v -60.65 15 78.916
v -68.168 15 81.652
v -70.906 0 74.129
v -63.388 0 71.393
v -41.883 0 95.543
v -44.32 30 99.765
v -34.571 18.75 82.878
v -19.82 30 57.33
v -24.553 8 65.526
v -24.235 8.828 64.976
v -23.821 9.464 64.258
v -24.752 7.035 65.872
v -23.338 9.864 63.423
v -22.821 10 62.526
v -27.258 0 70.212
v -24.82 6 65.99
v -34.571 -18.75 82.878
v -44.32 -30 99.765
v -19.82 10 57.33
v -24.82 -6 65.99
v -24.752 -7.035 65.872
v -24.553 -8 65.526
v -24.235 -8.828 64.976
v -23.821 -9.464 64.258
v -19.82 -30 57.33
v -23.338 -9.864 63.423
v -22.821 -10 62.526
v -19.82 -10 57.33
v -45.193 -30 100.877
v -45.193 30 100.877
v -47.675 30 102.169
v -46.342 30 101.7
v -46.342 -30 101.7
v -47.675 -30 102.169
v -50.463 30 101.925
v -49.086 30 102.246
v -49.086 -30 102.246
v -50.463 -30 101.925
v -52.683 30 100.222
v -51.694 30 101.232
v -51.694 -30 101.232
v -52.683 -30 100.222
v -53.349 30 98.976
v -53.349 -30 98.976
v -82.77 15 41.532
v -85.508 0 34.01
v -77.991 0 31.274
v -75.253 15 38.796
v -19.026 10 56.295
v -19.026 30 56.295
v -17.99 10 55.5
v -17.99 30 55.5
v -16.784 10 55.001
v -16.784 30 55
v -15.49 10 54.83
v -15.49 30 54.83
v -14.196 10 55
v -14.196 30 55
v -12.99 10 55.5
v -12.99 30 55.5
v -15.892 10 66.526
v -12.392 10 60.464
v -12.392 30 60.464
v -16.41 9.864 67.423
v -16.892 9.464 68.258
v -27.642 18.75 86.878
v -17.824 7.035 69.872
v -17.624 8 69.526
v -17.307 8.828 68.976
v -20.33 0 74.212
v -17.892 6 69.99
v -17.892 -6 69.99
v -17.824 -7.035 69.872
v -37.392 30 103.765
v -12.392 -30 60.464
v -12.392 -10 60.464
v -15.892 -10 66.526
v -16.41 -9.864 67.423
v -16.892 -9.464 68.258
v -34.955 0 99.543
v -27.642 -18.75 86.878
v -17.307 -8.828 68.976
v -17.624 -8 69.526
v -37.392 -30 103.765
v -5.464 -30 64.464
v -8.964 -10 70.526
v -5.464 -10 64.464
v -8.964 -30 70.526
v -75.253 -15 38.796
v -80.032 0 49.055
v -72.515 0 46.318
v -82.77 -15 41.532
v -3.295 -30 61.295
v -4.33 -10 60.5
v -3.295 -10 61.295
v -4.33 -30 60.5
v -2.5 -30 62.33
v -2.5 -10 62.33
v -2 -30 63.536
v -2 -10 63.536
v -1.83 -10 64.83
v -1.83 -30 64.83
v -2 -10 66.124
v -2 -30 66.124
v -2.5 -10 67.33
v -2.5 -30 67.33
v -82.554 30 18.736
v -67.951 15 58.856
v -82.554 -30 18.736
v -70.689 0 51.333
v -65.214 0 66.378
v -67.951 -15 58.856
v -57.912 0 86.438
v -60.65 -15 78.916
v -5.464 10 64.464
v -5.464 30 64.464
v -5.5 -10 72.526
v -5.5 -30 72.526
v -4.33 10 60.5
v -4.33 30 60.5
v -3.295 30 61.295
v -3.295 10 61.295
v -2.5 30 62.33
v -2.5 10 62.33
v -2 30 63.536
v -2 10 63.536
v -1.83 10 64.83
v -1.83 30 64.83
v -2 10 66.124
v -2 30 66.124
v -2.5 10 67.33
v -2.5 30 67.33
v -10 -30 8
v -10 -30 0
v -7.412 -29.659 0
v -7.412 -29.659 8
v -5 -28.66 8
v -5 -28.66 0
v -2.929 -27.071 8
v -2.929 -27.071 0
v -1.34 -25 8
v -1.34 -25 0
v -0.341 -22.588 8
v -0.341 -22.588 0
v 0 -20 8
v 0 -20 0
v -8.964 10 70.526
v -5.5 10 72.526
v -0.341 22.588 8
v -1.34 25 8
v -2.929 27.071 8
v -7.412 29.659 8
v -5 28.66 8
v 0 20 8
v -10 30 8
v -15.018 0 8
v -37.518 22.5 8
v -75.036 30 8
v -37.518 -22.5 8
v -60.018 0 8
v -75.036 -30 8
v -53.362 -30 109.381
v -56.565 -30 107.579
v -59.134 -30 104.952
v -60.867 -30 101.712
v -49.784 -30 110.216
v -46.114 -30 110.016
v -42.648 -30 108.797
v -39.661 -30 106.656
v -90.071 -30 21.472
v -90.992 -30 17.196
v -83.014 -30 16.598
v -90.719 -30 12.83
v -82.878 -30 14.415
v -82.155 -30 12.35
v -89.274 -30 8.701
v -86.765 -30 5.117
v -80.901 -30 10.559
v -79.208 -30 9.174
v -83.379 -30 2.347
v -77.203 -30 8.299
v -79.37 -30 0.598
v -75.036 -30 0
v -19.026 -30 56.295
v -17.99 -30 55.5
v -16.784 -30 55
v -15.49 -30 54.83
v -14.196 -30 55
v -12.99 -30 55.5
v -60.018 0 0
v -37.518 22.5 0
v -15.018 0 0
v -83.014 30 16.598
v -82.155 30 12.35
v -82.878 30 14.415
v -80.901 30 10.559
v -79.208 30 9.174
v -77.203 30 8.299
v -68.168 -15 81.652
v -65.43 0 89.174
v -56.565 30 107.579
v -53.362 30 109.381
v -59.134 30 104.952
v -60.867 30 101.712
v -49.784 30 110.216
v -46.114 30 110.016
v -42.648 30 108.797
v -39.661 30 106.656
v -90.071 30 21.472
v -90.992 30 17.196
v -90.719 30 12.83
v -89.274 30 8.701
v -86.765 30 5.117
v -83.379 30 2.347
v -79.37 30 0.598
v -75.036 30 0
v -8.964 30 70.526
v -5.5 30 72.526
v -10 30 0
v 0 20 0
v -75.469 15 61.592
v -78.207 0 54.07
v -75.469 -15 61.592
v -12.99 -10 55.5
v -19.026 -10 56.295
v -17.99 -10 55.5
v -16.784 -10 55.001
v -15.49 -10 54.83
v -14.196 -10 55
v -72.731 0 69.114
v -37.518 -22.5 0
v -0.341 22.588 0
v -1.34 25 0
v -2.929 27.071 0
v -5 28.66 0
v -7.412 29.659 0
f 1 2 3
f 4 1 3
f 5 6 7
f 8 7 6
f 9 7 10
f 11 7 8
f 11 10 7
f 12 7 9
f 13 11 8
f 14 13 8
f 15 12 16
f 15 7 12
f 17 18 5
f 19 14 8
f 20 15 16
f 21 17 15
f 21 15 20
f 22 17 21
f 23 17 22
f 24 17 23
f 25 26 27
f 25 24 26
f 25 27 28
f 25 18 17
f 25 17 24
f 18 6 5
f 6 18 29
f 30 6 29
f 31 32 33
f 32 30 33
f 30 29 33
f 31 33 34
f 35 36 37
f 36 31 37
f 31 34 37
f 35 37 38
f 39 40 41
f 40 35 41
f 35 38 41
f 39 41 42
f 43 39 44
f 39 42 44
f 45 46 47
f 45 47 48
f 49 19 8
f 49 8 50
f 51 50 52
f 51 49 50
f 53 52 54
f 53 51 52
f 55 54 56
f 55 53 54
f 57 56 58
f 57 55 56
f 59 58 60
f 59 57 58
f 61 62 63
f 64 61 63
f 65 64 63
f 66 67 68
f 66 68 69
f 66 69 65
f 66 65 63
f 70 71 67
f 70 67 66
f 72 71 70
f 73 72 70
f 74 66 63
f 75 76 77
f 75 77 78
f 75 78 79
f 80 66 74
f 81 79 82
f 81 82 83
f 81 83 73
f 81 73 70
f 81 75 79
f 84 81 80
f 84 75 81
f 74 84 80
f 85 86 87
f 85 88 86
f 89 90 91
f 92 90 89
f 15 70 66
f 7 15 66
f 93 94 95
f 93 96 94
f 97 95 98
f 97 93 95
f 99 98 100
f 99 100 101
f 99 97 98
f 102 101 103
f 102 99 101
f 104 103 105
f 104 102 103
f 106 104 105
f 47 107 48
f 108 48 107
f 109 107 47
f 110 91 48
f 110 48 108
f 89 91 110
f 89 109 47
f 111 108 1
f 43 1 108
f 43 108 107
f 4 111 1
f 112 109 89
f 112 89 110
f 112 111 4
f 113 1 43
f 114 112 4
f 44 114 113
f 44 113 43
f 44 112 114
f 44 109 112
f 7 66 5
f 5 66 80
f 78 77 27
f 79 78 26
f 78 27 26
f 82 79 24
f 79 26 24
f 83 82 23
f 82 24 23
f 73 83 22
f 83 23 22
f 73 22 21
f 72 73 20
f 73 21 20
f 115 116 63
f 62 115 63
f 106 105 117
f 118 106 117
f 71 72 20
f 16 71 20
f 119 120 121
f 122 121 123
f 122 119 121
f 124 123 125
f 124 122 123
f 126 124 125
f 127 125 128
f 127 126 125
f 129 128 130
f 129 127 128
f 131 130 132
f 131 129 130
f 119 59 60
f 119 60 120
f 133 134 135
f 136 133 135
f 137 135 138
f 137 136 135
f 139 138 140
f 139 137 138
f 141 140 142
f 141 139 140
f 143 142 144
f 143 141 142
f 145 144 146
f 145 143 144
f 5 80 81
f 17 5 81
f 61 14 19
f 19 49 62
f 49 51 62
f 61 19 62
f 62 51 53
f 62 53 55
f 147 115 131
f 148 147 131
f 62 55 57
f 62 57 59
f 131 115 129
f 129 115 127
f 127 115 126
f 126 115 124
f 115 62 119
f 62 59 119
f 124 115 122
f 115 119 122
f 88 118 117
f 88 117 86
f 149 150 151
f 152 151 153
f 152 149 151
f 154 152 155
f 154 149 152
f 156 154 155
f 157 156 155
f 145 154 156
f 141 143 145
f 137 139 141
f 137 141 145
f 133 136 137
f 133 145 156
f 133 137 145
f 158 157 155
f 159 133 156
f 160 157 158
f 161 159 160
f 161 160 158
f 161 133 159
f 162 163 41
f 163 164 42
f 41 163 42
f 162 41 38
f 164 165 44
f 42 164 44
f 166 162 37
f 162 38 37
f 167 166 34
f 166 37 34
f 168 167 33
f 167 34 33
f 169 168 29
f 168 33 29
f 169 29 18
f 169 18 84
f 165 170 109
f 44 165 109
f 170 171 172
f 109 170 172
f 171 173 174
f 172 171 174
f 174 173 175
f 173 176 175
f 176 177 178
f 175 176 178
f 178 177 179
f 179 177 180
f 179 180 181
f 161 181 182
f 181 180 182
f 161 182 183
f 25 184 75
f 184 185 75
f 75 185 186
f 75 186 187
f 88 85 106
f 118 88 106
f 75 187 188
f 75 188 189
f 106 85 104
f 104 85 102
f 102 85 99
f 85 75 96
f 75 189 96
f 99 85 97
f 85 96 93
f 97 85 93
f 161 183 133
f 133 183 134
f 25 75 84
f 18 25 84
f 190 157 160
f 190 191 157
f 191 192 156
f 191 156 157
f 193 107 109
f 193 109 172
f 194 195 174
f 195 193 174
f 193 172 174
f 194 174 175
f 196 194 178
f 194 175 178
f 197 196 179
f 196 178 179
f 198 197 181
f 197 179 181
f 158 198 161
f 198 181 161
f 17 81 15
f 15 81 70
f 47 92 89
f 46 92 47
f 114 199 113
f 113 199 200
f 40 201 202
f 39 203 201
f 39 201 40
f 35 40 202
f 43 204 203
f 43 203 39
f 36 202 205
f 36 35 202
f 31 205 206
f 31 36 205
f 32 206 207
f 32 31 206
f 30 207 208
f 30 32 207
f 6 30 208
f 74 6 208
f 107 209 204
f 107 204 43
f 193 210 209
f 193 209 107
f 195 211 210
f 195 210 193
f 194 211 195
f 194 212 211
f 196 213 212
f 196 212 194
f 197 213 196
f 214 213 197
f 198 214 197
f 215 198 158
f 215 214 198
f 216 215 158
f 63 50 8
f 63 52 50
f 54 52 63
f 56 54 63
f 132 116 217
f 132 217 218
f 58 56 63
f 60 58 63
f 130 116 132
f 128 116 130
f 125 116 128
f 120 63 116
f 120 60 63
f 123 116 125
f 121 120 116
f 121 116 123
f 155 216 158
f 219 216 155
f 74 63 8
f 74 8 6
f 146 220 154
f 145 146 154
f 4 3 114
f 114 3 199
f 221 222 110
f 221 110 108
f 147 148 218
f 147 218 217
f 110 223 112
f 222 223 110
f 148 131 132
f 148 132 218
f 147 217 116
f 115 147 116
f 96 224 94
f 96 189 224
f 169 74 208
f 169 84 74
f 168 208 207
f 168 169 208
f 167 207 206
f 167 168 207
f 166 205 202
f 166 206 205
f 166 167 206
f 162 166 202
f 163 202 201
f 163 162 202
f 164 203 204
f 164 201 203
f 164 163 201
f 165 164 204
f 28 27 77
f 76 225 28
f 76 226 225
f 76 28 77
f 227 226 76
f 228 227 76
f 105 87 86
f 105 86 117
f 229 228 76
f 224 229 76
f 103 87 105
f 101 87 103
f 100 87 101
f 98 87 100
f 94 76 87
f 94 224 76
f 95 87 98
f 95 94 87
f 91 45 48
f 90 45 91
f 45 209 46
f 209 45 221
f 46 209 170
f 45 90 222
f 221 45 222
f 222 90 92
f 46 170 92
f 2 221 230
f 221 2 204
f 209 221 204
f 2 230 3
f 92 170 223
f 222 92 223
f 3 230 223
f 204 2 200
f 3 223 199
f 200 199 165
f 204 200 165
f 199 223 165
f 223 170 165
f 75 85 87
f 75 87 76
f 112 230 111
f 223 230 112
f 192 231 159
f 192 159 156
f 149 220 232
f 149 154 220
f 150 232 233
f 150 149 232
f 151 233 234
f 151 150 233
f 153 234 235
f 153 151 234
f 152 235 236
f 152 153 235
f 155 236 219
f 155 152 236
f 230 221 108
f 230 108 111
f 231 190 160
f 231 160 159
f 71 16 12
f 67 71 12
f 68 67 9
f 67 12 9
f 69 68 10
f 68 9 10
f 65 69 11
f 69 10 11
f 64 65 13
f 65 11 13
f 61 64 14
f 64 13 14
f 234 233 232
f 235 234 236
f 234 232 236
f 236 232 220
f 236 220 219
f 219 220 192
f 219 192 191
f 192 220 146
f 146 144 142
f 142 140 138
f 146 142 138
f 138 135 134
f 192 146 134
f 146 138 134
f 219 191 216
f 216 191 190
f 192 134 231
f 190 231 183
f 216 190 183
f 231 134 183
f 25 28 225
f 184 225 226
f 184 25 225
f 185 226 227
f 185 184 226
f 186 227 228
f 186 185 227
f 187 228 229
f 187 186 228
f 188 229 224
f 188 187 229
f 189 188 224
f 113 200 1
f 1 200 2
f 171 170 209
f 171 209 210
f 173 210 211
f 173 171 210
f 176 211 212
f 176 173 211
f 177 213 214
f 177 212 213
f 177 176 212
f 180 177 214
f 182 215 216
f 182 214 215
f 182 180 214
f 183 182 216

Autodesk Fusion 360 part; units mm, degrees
sketch "Skizze1" plane through (0, 0, 0) normal (0, 1, 0) x (1, 0, 0)
  line L0 (0, 0) -> (-75.0363, 0)
  line L1 (-90.0714, -21.4723) -> (-60.8666, -101.7116)
  line L2 (0, 0) -> (0, -8)
  line L3 (0, -8) -> (-75.0363, -8)
  line L4 (-82.5538, -18.7362) -> (-53.3491, -98.9755)
  line L5 (-44.3205, -99.7654) -> (-17.3205, -53)
  line L6 (-17.3205, -53) -> (0, -63)
  line L7 (0, -63) -> (-5.5, -72.5263)
  line L8 (-5.5, -72.5263) -> (-8.9641, -70.5263)
  line L9 (-8.9641, -70.5263) -> (-5.4641, -64.4641)
  line L10 (-5.4641, -64.4641) -> (-12.3923, -60.4641)
  line L11 (-12.3923, -60.4641) -> (-37.3923, -103.7654)
  arc A0 (-53.3491, -98.9755) -> (-44.3205, -99.7654) centre (-48.6506, -97.2654) ccw
  arc A1 (-60.8666, -101.7116) -> (-37.3923, -103.7654) centre (-48.6506, -97.2654) ccw
  arc A2 (-75.0363, 0) -> (-90.0714, -21.4723) centre (-75.0363, -16) ccw
  arc A3 (-75.0363, -8) -> (-82.5538, -18.7362) centre (-75.0363, -16) ccw
  dimension "d3" = 8
  dimension "d4" = 8
  dimension "d5" = 8
  dimension "d7" = 30
  dimension "d8" = 4
  dimension "d10" = 4
  dimension "d11" = 8
  dimension "d12" = 7
  dimension "d19" = 70
  dimension "d20" = 50
  dimension "d21" = 5
  dimension "d23" = 8
  dimension "d24" = 45
extrude "Extrusion1" add sketch "Skizze1" along normal mid plane 60
fillet "Abrundung1" radius 10 2 edges at (0, 30, 4) (0, -30, 4)
fillet "Abrundung2" radius 5 2 edges at (-17.3205, 0, 53) (0, 0, 63)
sketch "Skizze2" plane through (-86.4361, 0, 31.4602) normal (-0.9397, 0, 0.342) x (0, -1, 0)
  line L0 (30, 74.7601) -> (-30, 74.7601)
  line L1 (-30, 74.7601) -> (-30, -10.6288)
  line L2 (-30, -10.6288) -> (30, -10.6288)
  line L3 (30, -10.6288) -> (30, 74.7601)
  line L4 (37, 74.7601) -> (69, 74.7601) construction
  line L5 (40.6572, -10.6288) -> (65.6572, -10.6288) construction
  line L6 (0, 61.418) -> (-15, 53.4128)
  line L7 (-15, 53.4128) -> (0, 45.4076)
  line L8 (0, 45.4076) -> (15, 53.4128)
  line L9 (15, 53.4128) -> (0, 61.418)
  line L10 (0, 95.9999) -> (0, -24.4616) construction
  line L11 (-15, 32.0656) -> (0, 40.0708)
  line L12 (15, 32.0656) -> (0, 24.0604)
  line L13 (0, 24.0604) -> (-15, 32.0656)
  line L14 (0, 40.0708) -> (15, 32.0656)
  line L15 (-15, 10.7184) -> (0, 18.7236)
  line L16 (15, 10.7184) -> (0, 2.7132)
  line L17 (0, 18.7236) -> (15, 10.7184)
  line L18 (0, 2.7132) -> (-15, 10.7184)
  line L19 (57.2523, 53.4128) -> (36.8368, 53.4128) construction
  line L20 (40.2669, 10.7184) -> (51.2669, 10.7184) construction
  line L21 (43.1326, 32.0656) -> (76.5646, 32.0656) construction
  line L22 (-30, 110.8277) -> (-30, 88.3059) construction
  line L23 (30, 114.6963) -> (30, 87.6508) construction
  line L24 (-15, 108.062) -> (-15, 86.5063) construction
  line L25 (15, 103.3946) -> (15, 87.227) construction
  line L26 (38.9734, 64.0864) -> (51.9734, 64.0864) construction
  line L27 (38.9734, 58.7496) -> (51.9734, 58.7496) construction
  line L28 (39, 61.418) -> (48, 61.418) construction
  line L29 (38.4081, 40.0708) -> (47.4081, 40.0708) construction
  line L30 (37.9929, 37.4024) -> (54, 37.4024) construction
  line L31 (38.8043, 42.7392) -> (51.8043, 42.7392) construction
  line L32 (38.9581, 21.392) -> (51.9581, 21.392) construction
  line L33 (38.4081, 18.7236) -> (47.4081, 18.7236) construction
  line L34 (40.1572, 16.0552) -> (53.1572, 16.0552) construction
sketch "Skizze3" plane through (0, 0, 0) normal (0, 0, -1) x (1, 0, 0)
  line L0 (-10, 30) -> (-75.0363, 30)
  line L1 (-75.0363, 30) -> (-75.0363, -30)
  line L2 (-75.0363, -30) -> (-10, -30)
  line L3 (-37.5181, 22.5) -> (-15.0181, 0)
  line L4 (-15.0181, 0) -> (-37.5181, -22.5)
  line L5 (-37.5181, -22.5) -> (-60.0181, 0)
  line L6 (-60.0181, 0) -> (-37.5181, 22.5)
  line L7 (20.4049, 0) -> (39.4049, 0) construction
  line L8 (22.3322, 30) -> (39.3616, 30) construction
  line L9 (19.3322, -30) -> (41.3322, -30) construction
  line L10 (-37.5181, 48.9997) -> (-37.5181, 36.9997) construction
  line L11 (-75.0363, 50.8097) -> (-75.0363, 32.3583) construction
  line L12 (0, 53.6395) -> (0, 35.107) construction
  arc A0 (0, 20) -> (-10, 30) centre (-10, 20) ccw
  arc A1 (-10, -30) -> (0, -20) centre (-10, -20) ccw
  line L13 (0, -20) -> (0, 20)
  dimension "d82" = 7.5
sketch "Skizze4" plane through (0, 0, 0) normal (0, 1, 0) x (1, 0, 0)
  line L0 (-7.5, -75.9904) -> (-24.8205, -65.9904)
  line L1 (-24.8205, -65.9904) -> (-17.3205, -53)
  line L2 (-17.3205, -53) -> (0, -63)
  line L3 (0, -63) -> (-7.5, -75.9904)
  line L4 (-4.3301, -60.5) -> (-12.9904, -55.5)
  line L5 (-5.5, -72.5263) -> (-2.5, -67.3301)
  line L6 (-19.8205, -57.3301) -> (-44.3205, -99.7654)
  dimension "d68" = 15
extrude "Extrusion2" cut sketch "Skizze4" along normal mid plane 20
fillet "Abrundung3" radius 4 2 edges at (-21.3564, 10, 67.9904) (-21.3564, -10, 67.9904)
sketch "Skizze5" plane through (16.8875, 0, 9.75) normal (0.866, 0, 0.5) x (0, 1, 0)
  line L0 (30, 58.5596) -> (30, 108.5596)
  line L1 (30, 108.5596) -> (-30, 108.5596)
  line L2 (-30, 108.5596) -> (-30, 58.5596)
  line L3 (18.75, 89.0596) -> (0, 103.6846)
  line L4 (0, 103.6846) -> (-18.75, 89.0596)
  line L5 (-18.75, 89.0596) -> (0, 74.4346)
  line L6 (0, 74.4346) -> (18.75, 89.0596)
  line L7 (18.75, 89.0596) -> (-18.75, 89.0596) construction
  line L8 (0, 103.6846) -> (0, 74.4346) construction
  line L9 (0, 132.1709) -> (0, 54.7397)
  line L10 (57, 89.0596) -> (43, 89.0596) construction
  line L11 (41.8287, 108.5596) -> (56.8287, 108.5596) construction
  line L12 (41.1202, 69.5596) -> (58.1202, 69.5596) construction
  line L13 (10, 58.5596) -> (30, 58.5596)
  line L14 (15, 145.9398) -> (15, 132.9398) construction
  line L15 (22.5, 142.6003) -> (22.5, 134.6003) construction
  line L16 (42, 103.6846) -> (64, 103.6846) construction
  line L17 (42, 98.8096) -> (60, 98.8096) construction
  line L18 (18.75, 141.5724) -> (18.75, 135.5724) construction
  line L19 (10, 65.5596) -> (10, 58.5596)
  line L20 (-10, 58.5596) -> (-10, 65.5596)
  arc A0 (-6, 69.5596) -> (-10, 65.5596) centre (-6, 65.5596) ccw
  arc A1 (10, 65.5596) -> (6, 69.5596) centre (6, 65.5596) ccw
  line L21 (-6, 69.5596) -> (6, 69.5596)
  line L22 (-30, 58.5596) -> (-10, 58.5596)
  point P0 (0, 89.0596)
extrude "Extrusion3" cut sketch "Skizze5" against normal up to surface (8 mm away) contours L4 L5 L9 | L3 L6 L9
extrude "Extrusion4" cut sketch "Skizze3" against normal up to surface (8 mm away) contours L3 L4 L5 L6
extrude "Extrusion5" cut sketch "Skizze2" against normal up to surface (8 mm away) contours L6 L7 L8 L9 | L11 L12 L13 L14 | L15 L16 L17 L18
equation "angle = 30 deg"
equation "d4 = d3"
equation "d5 = d3"
equation "d7 = angle"
equation "d8 = d3 / 2"
equation "thickness = 8 mm"
equation "d10 = d8"
equation "d11 = thickness"
equation "d12 = bracket_depth"
equation "bracket_depth = 7 mm"
equation "length = 150 mm"
equation "width = 60 mm"
equation "cable_width = 20 mm"
equation "d20 = length / 3"
equation "d24 = platform_height"
equation "platform_height = 45 mm"
equation "d26 = width / 2"
equation "d50 = 45.35489 mm / 3"
equation "d53 = 90.709781 mm / 13"
equation "d54 = d53"
equation "d56 = 90.709781 mm * 3 / 14"
equation "d62 = 57.359 mm * 3 / 13"
equation "d69 = cable_width / 2"
